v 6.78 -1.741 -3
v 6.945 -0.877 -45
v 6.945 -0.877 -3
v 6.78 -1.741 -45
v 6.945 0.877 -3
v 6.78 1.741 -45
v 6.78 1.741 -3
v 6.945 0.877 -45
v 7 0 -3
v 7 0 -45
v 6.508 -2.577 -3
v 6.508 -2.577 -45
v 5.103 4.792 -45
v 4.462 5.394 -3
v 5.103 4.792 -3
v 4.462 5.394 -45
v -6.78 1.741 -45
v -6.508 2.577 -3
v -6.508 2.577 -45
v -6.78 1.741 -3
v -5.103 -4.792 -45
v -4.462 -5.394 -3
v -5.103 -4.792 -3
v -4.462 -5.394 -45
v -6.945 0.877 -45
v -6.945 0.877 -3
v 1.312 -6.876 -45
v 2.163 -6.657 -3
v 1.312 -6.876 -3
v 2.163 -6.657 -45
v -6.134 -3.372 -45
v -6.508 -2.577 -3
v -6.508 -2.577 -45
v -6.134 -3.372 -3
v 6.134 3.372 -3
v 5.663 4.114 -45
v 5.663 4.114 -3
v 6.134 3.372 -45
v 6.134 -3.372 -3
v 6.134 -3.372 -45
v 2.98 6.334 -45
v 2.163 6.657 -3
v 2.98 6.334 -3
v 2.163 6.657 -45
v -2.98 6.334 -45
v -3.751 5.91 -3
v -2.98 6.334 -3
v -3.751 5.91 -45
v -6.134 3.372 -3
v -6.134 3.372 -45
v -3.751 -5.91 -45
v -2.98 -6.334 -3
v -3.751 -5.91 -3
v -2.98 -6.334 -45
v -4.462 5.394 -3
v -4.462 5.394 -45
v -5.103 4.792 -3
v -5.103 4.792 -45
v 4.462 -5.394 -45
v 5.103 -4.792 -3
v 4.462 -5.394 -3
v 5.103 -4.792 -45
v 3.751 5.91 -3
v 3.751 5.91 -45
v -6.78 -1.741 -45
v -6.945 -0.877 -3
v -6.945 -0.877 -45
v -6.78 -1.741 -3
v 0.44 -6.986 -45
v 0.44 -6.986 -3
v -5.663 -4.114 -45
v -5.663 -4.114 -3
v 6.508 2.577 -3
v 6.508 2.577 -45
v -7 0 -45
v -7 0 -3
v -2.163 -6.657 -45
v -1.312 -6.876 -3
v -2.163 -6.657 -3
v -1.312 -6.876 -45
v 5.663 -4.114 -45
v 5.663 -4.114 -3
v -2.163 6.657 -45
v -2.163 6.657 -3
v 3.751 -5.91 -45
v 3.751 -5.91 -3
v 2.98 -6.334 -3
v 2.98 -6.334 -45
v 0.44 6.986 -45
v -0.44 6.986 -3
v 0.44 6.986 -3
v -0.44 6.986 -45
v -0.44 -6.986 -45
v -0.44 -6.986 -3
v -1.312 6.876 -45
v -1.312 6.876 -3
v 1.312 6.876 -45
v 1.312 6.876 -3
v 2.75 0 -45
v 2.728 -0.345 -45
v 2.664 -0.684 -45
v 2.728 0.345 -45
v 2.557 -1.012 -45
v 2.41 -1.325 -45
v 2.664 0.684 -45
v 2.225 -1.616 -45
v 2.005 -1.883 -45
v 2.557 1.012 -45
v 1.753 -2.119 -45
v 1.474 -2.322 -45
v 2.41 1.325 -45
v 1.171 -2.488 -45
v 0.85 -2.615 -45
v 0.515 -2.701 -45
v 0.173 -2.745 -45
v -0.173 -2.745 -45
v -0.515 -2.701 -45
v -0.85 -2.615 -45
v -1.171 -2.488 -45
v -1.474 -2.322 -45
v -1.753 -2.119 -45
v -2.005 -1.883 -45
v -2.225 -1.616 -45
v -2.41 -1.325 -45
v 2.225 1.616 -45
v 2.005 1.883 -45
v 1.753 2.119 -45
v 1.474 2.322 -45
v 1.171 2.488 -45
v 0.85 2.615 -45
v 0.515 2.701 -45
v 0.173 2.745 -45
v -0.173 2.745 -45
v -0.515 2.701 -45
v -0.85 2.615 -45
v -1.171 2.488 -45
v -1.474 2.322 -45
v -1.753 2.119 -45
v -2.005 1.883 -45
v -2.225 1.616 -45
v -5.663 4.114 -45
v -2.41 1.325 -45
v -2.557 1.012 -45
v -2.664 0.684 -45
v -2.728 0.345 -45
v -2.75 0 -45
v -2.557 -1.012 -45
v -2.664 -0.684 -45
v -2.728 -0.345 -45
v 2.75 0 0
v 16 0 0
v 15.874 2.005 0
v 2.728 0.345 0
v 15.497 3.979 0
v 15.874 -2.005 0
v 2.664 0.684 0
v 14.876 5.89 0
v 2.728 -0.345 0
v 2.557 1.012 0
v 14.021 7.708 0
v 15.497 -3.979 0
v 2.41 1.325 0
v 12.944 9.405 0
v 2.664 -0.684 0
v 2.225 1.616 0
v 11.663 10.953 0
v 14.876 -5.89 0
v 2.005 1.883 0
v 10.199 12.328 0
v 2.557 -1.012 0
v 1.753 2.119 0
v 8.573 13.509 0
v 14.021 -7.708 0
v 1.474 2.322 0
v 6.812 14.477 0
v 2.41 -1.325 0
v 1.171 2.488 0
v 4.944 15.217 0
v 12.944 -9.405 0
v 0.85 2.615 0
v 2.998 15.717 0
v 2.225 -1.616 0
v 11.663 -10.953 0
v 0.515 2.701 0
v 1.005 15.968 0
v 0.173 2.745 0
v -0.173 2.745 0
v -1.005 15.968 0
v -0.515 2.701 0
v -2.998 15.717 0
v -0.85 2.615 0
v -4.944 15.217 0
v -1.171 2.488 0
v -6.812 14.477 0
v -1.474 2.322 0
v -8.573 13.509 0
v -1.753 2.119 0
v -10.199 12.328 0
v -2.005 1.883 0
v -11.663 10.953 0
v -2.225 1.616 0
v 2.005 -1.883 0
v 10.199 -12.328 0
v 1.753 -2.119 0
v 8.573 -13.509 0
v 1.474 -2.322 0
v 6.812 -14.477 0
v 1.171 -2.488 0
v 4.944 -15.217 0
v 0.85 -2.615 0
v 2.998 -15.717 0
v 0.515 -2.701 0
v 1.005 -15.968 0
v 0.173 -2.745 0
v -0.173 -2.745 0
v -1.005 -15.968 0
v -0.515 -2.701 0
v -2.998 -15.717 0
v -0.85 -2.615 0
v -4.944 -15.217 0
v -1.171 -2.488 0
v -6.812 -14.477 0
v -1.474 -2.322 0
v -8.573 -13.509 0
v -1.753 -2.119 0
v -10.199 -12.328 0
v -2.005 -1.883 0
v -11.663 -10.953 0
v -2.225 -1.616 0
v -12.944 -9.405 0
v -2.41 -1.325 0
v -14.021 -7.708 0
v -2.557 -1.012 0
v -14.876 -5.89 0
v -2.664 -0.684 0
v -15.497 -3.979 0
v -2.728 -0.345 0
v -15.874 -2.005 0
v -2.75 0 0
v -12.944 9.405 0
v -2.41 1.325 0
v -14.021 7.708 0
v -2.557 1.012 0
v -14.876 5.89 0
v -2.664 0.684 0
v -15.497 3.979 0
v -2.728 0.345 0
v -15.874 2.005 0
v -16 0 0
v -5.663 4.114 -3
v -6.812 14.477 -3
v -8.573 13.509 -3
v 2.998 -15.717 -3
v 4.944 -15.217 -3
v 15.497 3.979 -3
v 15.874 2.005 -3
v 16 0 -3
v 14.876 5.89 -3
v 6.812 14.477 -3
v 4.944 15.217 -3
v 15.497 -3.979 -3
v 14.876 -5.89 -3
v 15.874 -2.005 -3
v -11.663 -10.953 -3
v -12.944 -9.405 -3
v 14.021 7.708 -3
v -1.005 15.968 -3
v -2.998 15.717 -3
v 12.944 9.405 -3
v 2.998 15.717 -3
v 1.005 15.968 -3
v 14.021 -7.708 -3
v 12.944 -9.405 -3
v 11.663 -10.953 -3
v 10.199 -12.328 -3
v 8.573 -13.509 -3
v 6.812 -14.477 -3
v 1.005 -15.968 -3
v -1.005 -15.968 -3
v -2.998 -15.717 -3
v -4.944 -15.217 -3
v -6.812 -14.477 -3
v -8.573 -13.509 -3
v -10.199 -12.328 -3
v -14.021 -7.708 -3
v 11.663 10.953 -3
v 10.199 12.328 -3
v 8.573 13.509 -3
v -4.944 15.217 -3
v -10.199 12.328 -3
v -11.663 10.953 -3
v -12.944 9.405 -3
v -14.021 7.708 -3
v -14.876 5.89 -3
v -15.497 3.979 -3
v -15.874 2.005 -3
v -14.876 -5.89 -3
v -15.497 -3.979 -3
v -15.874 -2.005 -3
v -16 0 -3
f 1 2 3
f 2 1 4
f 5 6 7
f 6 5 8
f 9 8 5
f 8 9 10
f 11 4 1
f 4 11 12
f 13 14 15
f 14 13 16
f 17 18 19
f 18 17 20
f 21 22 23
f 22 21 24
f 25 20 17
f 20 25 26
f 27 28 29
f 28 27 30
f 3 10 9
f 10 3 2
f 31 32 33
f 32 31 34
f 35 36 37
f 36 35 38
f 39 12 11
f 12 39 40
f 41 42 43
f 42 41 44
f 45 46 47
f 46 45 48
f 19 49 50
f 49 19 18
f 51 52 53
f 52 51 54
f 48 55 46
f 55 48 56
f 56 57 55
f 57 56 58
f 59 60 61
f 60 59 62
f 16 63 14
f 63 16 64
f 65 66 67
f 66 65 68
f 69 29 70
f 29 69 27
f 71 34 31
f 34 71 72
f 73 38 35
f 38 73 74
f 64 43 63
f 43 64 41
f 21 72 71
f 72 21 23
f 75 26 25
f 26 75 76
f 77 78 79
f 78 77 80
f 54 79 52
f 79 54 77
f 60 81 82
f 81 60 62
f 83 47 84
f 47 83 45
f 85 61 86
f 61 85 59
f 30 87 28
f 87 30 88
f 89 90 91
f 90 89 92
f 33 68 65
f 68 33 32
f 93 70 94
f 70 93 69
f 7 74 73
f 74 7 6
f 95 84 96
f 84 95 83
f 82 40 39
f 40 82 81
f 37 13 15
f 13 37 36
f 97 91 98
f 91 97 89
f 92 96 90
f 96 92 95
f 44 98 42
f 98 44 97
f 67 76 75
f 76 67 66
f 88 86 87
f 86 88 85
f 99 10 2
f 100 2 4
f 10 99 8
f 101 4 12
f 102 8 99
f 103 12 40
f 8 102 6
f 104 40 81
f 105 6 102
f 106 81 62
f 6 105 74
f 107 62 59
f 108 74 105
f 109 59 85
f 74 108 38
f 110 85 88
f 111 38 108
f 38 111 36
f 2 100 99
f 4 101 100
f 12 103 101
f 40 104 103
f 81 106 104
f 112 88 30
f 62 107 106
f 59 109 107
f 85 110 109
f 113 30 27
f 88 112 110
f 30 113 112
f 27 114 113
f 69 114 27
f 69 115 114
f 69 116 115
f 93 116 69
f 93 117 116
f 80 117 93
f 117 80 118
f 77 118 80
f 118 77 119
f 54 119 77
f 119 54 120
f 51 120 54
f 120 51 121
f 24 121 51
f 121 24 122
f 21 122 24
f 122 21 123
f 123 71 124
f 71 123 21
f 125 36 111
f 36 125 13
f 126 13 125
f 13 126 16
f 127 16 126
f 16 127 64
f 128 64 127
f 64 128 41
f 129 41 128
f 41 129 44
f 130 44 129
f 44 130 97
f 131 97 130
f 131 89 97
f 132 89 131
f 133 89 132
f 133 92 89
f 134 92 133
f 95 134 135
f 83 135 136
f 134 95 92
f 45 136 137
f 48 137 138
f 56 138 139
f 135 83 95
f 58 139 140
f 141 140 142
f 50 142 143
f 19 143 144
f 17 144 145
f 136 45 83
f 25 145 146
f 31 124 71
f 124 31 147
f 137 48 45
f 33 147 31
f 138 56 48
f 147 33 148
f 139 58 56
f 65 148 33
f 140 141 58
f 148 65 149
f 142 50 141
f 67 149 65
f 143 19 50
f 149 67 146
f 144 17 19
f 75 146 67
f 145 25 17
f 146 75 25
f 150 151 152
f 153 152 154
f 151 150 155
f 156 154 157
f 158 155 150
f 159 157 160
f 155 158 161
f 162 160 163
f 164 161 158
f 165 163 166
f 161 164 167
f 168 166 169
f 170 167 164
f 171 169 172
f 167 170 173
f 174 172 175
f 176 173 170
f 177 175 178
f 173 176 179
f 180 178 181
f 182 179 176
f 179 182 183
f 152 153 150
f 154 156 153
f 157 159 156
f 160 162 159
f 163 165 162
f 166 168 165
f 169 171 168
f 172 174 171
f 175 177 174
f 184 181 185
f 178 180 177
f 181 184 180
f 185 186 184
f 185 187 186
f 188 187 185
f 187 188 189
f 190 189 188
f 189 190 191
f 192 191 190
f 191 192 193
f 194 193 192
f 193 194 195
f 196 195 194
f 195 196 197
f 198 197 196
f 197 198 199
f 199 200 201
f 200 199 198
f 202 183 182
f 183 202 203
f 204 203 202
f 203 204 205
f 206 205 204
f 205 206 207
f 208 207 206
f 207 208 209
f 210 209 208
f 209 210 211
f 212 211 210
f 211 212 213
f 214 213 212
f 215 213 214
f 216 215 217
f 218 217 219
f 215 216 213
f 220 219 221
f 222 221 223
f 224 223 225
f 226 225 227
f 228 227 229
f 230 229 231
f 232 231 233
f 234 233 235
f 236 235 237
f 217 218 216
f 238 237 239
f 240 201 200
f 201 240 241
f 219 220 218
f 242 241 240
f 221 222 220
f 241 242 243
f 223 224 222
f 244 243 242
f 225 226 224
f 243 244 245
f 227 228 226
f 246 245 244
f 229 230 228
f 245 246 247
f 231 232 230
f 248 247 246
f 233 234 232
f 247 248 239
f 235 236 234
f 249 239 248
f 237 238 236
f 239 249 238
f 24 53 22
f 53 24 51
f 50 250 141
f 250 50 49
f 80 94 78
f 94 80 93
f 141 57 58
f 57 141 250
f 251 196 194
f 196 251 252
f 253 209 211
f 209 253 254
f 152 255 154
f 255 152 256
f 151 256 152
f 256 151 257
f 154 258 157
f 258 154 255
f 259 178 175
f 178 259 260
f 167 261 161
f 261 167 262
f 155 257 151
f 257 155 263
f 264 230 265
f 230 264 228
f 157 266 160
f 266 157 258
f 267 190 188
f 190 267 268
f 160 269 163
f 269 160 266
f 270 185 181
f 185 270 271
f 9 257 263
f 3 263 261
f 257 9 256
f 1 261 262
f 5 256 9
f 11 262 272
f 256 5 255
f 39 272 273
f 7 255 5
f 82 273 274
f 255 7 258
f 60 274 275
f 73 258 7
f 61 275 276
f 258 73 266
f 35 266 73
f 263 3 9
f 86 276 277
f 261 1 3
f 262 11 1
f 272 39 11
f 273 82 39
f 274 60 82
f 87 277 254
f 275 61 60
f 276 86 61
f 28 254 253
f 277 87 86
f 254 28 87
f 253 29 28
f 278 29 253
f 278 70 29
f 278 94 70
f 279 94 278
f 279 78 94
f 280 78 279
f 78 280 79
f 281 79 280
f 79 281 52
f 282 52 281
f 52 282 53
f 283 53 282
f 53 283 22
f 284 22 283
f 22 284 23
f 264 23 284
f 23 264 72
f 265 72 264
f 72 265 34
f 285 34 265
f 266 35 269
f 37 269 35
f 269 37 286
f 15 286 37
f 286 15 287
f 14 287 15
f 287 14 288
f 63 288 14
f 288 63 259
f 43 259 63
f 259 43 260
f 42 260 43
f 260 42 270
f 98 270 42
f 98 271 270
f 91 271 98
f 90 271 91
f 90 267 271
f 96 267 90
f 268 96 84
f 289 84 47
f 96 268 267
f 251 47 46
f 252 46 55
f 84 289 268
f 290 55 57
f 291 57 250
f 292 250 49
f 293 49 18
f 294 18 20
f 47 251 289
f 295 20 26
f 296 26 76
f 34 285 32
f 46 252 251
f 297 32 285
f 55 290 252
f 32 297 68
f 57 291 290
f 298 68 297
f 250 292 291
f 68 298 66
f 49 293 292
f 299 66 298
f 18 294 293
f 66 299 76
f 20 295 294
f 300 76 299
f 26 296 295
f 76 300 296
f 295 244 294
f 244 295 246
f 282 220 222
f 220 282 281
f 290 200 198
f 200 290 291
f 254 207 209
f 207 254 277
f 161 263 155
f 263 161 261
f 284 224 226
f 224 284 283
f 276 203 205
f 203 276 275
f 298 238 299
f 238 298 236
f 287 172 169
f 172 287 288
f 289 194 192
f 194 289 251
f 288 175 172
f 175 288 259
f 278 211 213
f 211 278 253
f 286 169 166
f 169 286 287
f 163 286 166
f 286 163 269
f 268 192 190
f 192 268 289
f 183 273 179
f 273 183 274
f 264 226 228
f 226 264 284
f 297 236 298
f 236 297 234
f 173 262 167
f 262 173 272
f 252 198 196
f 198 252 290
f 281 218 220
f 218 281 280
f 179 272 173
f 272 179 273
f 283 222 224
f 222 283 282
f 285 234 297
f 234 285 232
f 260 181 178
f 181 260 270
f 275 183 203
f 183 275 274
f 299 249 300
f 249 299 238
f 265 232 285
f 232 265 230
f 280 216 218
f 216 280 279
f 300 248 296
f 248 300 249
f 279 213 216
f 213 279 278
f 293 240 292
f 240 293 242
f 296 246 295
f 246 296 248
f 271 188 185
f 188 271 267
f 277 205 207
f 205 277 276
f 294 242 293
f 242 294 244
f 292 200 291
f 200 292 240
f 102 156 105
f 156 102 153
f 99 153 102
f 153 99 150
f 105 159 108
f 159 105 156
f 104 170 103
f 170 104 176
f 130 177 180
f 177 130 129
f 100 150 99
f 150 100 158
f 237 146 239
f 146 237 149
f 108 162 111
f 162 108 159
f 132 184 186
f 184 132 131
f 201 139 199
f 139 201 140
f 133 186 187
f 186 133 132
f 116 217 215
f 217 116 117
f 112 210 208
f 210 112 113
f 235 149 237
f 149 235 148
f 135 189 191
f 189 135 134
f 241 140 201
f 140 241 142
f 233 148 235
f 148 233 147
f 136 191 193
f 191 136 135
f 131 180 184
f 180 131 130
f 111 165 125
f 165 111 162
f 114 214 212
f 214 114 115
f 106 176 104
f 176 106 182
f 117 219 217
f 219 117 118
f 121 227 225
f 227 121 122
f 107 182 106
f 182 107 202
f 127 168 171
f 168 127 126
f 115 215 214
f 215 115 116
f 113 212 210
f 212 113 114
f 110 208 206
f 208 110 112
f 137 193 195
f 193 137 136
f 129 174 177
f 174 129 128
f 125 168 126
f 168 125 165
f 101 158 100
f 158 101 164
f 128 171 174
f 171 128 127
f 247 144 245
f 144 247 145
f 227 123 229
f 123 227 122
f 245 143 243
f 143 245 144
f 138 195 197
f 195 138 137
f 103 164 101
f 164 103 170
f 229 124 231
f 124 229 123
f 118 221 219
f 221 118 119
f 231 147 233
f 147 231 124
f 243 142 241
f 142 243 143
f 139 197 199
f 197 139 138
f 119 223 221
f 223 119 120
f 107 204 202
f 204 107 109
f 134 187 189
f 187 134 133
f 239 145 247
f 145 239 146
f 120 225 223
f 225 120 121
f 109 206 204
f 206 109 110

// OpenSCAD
$fn = 50;


difference() {
	union() {
		translate(v = [0, 0, -45.0000000000]) {
			cylinder(h = 45, r = 7.0000000000);
		}
		translate(v = [0, 0, -3.0000000000]) {
			cylinder(h = 3, r = 16.0000000000);
		}
	}
	union() {
		#translate(v = [0, 0, -45]) {
			cylinder(h = 45, r = 2.7500000000);
		}
	}
}
